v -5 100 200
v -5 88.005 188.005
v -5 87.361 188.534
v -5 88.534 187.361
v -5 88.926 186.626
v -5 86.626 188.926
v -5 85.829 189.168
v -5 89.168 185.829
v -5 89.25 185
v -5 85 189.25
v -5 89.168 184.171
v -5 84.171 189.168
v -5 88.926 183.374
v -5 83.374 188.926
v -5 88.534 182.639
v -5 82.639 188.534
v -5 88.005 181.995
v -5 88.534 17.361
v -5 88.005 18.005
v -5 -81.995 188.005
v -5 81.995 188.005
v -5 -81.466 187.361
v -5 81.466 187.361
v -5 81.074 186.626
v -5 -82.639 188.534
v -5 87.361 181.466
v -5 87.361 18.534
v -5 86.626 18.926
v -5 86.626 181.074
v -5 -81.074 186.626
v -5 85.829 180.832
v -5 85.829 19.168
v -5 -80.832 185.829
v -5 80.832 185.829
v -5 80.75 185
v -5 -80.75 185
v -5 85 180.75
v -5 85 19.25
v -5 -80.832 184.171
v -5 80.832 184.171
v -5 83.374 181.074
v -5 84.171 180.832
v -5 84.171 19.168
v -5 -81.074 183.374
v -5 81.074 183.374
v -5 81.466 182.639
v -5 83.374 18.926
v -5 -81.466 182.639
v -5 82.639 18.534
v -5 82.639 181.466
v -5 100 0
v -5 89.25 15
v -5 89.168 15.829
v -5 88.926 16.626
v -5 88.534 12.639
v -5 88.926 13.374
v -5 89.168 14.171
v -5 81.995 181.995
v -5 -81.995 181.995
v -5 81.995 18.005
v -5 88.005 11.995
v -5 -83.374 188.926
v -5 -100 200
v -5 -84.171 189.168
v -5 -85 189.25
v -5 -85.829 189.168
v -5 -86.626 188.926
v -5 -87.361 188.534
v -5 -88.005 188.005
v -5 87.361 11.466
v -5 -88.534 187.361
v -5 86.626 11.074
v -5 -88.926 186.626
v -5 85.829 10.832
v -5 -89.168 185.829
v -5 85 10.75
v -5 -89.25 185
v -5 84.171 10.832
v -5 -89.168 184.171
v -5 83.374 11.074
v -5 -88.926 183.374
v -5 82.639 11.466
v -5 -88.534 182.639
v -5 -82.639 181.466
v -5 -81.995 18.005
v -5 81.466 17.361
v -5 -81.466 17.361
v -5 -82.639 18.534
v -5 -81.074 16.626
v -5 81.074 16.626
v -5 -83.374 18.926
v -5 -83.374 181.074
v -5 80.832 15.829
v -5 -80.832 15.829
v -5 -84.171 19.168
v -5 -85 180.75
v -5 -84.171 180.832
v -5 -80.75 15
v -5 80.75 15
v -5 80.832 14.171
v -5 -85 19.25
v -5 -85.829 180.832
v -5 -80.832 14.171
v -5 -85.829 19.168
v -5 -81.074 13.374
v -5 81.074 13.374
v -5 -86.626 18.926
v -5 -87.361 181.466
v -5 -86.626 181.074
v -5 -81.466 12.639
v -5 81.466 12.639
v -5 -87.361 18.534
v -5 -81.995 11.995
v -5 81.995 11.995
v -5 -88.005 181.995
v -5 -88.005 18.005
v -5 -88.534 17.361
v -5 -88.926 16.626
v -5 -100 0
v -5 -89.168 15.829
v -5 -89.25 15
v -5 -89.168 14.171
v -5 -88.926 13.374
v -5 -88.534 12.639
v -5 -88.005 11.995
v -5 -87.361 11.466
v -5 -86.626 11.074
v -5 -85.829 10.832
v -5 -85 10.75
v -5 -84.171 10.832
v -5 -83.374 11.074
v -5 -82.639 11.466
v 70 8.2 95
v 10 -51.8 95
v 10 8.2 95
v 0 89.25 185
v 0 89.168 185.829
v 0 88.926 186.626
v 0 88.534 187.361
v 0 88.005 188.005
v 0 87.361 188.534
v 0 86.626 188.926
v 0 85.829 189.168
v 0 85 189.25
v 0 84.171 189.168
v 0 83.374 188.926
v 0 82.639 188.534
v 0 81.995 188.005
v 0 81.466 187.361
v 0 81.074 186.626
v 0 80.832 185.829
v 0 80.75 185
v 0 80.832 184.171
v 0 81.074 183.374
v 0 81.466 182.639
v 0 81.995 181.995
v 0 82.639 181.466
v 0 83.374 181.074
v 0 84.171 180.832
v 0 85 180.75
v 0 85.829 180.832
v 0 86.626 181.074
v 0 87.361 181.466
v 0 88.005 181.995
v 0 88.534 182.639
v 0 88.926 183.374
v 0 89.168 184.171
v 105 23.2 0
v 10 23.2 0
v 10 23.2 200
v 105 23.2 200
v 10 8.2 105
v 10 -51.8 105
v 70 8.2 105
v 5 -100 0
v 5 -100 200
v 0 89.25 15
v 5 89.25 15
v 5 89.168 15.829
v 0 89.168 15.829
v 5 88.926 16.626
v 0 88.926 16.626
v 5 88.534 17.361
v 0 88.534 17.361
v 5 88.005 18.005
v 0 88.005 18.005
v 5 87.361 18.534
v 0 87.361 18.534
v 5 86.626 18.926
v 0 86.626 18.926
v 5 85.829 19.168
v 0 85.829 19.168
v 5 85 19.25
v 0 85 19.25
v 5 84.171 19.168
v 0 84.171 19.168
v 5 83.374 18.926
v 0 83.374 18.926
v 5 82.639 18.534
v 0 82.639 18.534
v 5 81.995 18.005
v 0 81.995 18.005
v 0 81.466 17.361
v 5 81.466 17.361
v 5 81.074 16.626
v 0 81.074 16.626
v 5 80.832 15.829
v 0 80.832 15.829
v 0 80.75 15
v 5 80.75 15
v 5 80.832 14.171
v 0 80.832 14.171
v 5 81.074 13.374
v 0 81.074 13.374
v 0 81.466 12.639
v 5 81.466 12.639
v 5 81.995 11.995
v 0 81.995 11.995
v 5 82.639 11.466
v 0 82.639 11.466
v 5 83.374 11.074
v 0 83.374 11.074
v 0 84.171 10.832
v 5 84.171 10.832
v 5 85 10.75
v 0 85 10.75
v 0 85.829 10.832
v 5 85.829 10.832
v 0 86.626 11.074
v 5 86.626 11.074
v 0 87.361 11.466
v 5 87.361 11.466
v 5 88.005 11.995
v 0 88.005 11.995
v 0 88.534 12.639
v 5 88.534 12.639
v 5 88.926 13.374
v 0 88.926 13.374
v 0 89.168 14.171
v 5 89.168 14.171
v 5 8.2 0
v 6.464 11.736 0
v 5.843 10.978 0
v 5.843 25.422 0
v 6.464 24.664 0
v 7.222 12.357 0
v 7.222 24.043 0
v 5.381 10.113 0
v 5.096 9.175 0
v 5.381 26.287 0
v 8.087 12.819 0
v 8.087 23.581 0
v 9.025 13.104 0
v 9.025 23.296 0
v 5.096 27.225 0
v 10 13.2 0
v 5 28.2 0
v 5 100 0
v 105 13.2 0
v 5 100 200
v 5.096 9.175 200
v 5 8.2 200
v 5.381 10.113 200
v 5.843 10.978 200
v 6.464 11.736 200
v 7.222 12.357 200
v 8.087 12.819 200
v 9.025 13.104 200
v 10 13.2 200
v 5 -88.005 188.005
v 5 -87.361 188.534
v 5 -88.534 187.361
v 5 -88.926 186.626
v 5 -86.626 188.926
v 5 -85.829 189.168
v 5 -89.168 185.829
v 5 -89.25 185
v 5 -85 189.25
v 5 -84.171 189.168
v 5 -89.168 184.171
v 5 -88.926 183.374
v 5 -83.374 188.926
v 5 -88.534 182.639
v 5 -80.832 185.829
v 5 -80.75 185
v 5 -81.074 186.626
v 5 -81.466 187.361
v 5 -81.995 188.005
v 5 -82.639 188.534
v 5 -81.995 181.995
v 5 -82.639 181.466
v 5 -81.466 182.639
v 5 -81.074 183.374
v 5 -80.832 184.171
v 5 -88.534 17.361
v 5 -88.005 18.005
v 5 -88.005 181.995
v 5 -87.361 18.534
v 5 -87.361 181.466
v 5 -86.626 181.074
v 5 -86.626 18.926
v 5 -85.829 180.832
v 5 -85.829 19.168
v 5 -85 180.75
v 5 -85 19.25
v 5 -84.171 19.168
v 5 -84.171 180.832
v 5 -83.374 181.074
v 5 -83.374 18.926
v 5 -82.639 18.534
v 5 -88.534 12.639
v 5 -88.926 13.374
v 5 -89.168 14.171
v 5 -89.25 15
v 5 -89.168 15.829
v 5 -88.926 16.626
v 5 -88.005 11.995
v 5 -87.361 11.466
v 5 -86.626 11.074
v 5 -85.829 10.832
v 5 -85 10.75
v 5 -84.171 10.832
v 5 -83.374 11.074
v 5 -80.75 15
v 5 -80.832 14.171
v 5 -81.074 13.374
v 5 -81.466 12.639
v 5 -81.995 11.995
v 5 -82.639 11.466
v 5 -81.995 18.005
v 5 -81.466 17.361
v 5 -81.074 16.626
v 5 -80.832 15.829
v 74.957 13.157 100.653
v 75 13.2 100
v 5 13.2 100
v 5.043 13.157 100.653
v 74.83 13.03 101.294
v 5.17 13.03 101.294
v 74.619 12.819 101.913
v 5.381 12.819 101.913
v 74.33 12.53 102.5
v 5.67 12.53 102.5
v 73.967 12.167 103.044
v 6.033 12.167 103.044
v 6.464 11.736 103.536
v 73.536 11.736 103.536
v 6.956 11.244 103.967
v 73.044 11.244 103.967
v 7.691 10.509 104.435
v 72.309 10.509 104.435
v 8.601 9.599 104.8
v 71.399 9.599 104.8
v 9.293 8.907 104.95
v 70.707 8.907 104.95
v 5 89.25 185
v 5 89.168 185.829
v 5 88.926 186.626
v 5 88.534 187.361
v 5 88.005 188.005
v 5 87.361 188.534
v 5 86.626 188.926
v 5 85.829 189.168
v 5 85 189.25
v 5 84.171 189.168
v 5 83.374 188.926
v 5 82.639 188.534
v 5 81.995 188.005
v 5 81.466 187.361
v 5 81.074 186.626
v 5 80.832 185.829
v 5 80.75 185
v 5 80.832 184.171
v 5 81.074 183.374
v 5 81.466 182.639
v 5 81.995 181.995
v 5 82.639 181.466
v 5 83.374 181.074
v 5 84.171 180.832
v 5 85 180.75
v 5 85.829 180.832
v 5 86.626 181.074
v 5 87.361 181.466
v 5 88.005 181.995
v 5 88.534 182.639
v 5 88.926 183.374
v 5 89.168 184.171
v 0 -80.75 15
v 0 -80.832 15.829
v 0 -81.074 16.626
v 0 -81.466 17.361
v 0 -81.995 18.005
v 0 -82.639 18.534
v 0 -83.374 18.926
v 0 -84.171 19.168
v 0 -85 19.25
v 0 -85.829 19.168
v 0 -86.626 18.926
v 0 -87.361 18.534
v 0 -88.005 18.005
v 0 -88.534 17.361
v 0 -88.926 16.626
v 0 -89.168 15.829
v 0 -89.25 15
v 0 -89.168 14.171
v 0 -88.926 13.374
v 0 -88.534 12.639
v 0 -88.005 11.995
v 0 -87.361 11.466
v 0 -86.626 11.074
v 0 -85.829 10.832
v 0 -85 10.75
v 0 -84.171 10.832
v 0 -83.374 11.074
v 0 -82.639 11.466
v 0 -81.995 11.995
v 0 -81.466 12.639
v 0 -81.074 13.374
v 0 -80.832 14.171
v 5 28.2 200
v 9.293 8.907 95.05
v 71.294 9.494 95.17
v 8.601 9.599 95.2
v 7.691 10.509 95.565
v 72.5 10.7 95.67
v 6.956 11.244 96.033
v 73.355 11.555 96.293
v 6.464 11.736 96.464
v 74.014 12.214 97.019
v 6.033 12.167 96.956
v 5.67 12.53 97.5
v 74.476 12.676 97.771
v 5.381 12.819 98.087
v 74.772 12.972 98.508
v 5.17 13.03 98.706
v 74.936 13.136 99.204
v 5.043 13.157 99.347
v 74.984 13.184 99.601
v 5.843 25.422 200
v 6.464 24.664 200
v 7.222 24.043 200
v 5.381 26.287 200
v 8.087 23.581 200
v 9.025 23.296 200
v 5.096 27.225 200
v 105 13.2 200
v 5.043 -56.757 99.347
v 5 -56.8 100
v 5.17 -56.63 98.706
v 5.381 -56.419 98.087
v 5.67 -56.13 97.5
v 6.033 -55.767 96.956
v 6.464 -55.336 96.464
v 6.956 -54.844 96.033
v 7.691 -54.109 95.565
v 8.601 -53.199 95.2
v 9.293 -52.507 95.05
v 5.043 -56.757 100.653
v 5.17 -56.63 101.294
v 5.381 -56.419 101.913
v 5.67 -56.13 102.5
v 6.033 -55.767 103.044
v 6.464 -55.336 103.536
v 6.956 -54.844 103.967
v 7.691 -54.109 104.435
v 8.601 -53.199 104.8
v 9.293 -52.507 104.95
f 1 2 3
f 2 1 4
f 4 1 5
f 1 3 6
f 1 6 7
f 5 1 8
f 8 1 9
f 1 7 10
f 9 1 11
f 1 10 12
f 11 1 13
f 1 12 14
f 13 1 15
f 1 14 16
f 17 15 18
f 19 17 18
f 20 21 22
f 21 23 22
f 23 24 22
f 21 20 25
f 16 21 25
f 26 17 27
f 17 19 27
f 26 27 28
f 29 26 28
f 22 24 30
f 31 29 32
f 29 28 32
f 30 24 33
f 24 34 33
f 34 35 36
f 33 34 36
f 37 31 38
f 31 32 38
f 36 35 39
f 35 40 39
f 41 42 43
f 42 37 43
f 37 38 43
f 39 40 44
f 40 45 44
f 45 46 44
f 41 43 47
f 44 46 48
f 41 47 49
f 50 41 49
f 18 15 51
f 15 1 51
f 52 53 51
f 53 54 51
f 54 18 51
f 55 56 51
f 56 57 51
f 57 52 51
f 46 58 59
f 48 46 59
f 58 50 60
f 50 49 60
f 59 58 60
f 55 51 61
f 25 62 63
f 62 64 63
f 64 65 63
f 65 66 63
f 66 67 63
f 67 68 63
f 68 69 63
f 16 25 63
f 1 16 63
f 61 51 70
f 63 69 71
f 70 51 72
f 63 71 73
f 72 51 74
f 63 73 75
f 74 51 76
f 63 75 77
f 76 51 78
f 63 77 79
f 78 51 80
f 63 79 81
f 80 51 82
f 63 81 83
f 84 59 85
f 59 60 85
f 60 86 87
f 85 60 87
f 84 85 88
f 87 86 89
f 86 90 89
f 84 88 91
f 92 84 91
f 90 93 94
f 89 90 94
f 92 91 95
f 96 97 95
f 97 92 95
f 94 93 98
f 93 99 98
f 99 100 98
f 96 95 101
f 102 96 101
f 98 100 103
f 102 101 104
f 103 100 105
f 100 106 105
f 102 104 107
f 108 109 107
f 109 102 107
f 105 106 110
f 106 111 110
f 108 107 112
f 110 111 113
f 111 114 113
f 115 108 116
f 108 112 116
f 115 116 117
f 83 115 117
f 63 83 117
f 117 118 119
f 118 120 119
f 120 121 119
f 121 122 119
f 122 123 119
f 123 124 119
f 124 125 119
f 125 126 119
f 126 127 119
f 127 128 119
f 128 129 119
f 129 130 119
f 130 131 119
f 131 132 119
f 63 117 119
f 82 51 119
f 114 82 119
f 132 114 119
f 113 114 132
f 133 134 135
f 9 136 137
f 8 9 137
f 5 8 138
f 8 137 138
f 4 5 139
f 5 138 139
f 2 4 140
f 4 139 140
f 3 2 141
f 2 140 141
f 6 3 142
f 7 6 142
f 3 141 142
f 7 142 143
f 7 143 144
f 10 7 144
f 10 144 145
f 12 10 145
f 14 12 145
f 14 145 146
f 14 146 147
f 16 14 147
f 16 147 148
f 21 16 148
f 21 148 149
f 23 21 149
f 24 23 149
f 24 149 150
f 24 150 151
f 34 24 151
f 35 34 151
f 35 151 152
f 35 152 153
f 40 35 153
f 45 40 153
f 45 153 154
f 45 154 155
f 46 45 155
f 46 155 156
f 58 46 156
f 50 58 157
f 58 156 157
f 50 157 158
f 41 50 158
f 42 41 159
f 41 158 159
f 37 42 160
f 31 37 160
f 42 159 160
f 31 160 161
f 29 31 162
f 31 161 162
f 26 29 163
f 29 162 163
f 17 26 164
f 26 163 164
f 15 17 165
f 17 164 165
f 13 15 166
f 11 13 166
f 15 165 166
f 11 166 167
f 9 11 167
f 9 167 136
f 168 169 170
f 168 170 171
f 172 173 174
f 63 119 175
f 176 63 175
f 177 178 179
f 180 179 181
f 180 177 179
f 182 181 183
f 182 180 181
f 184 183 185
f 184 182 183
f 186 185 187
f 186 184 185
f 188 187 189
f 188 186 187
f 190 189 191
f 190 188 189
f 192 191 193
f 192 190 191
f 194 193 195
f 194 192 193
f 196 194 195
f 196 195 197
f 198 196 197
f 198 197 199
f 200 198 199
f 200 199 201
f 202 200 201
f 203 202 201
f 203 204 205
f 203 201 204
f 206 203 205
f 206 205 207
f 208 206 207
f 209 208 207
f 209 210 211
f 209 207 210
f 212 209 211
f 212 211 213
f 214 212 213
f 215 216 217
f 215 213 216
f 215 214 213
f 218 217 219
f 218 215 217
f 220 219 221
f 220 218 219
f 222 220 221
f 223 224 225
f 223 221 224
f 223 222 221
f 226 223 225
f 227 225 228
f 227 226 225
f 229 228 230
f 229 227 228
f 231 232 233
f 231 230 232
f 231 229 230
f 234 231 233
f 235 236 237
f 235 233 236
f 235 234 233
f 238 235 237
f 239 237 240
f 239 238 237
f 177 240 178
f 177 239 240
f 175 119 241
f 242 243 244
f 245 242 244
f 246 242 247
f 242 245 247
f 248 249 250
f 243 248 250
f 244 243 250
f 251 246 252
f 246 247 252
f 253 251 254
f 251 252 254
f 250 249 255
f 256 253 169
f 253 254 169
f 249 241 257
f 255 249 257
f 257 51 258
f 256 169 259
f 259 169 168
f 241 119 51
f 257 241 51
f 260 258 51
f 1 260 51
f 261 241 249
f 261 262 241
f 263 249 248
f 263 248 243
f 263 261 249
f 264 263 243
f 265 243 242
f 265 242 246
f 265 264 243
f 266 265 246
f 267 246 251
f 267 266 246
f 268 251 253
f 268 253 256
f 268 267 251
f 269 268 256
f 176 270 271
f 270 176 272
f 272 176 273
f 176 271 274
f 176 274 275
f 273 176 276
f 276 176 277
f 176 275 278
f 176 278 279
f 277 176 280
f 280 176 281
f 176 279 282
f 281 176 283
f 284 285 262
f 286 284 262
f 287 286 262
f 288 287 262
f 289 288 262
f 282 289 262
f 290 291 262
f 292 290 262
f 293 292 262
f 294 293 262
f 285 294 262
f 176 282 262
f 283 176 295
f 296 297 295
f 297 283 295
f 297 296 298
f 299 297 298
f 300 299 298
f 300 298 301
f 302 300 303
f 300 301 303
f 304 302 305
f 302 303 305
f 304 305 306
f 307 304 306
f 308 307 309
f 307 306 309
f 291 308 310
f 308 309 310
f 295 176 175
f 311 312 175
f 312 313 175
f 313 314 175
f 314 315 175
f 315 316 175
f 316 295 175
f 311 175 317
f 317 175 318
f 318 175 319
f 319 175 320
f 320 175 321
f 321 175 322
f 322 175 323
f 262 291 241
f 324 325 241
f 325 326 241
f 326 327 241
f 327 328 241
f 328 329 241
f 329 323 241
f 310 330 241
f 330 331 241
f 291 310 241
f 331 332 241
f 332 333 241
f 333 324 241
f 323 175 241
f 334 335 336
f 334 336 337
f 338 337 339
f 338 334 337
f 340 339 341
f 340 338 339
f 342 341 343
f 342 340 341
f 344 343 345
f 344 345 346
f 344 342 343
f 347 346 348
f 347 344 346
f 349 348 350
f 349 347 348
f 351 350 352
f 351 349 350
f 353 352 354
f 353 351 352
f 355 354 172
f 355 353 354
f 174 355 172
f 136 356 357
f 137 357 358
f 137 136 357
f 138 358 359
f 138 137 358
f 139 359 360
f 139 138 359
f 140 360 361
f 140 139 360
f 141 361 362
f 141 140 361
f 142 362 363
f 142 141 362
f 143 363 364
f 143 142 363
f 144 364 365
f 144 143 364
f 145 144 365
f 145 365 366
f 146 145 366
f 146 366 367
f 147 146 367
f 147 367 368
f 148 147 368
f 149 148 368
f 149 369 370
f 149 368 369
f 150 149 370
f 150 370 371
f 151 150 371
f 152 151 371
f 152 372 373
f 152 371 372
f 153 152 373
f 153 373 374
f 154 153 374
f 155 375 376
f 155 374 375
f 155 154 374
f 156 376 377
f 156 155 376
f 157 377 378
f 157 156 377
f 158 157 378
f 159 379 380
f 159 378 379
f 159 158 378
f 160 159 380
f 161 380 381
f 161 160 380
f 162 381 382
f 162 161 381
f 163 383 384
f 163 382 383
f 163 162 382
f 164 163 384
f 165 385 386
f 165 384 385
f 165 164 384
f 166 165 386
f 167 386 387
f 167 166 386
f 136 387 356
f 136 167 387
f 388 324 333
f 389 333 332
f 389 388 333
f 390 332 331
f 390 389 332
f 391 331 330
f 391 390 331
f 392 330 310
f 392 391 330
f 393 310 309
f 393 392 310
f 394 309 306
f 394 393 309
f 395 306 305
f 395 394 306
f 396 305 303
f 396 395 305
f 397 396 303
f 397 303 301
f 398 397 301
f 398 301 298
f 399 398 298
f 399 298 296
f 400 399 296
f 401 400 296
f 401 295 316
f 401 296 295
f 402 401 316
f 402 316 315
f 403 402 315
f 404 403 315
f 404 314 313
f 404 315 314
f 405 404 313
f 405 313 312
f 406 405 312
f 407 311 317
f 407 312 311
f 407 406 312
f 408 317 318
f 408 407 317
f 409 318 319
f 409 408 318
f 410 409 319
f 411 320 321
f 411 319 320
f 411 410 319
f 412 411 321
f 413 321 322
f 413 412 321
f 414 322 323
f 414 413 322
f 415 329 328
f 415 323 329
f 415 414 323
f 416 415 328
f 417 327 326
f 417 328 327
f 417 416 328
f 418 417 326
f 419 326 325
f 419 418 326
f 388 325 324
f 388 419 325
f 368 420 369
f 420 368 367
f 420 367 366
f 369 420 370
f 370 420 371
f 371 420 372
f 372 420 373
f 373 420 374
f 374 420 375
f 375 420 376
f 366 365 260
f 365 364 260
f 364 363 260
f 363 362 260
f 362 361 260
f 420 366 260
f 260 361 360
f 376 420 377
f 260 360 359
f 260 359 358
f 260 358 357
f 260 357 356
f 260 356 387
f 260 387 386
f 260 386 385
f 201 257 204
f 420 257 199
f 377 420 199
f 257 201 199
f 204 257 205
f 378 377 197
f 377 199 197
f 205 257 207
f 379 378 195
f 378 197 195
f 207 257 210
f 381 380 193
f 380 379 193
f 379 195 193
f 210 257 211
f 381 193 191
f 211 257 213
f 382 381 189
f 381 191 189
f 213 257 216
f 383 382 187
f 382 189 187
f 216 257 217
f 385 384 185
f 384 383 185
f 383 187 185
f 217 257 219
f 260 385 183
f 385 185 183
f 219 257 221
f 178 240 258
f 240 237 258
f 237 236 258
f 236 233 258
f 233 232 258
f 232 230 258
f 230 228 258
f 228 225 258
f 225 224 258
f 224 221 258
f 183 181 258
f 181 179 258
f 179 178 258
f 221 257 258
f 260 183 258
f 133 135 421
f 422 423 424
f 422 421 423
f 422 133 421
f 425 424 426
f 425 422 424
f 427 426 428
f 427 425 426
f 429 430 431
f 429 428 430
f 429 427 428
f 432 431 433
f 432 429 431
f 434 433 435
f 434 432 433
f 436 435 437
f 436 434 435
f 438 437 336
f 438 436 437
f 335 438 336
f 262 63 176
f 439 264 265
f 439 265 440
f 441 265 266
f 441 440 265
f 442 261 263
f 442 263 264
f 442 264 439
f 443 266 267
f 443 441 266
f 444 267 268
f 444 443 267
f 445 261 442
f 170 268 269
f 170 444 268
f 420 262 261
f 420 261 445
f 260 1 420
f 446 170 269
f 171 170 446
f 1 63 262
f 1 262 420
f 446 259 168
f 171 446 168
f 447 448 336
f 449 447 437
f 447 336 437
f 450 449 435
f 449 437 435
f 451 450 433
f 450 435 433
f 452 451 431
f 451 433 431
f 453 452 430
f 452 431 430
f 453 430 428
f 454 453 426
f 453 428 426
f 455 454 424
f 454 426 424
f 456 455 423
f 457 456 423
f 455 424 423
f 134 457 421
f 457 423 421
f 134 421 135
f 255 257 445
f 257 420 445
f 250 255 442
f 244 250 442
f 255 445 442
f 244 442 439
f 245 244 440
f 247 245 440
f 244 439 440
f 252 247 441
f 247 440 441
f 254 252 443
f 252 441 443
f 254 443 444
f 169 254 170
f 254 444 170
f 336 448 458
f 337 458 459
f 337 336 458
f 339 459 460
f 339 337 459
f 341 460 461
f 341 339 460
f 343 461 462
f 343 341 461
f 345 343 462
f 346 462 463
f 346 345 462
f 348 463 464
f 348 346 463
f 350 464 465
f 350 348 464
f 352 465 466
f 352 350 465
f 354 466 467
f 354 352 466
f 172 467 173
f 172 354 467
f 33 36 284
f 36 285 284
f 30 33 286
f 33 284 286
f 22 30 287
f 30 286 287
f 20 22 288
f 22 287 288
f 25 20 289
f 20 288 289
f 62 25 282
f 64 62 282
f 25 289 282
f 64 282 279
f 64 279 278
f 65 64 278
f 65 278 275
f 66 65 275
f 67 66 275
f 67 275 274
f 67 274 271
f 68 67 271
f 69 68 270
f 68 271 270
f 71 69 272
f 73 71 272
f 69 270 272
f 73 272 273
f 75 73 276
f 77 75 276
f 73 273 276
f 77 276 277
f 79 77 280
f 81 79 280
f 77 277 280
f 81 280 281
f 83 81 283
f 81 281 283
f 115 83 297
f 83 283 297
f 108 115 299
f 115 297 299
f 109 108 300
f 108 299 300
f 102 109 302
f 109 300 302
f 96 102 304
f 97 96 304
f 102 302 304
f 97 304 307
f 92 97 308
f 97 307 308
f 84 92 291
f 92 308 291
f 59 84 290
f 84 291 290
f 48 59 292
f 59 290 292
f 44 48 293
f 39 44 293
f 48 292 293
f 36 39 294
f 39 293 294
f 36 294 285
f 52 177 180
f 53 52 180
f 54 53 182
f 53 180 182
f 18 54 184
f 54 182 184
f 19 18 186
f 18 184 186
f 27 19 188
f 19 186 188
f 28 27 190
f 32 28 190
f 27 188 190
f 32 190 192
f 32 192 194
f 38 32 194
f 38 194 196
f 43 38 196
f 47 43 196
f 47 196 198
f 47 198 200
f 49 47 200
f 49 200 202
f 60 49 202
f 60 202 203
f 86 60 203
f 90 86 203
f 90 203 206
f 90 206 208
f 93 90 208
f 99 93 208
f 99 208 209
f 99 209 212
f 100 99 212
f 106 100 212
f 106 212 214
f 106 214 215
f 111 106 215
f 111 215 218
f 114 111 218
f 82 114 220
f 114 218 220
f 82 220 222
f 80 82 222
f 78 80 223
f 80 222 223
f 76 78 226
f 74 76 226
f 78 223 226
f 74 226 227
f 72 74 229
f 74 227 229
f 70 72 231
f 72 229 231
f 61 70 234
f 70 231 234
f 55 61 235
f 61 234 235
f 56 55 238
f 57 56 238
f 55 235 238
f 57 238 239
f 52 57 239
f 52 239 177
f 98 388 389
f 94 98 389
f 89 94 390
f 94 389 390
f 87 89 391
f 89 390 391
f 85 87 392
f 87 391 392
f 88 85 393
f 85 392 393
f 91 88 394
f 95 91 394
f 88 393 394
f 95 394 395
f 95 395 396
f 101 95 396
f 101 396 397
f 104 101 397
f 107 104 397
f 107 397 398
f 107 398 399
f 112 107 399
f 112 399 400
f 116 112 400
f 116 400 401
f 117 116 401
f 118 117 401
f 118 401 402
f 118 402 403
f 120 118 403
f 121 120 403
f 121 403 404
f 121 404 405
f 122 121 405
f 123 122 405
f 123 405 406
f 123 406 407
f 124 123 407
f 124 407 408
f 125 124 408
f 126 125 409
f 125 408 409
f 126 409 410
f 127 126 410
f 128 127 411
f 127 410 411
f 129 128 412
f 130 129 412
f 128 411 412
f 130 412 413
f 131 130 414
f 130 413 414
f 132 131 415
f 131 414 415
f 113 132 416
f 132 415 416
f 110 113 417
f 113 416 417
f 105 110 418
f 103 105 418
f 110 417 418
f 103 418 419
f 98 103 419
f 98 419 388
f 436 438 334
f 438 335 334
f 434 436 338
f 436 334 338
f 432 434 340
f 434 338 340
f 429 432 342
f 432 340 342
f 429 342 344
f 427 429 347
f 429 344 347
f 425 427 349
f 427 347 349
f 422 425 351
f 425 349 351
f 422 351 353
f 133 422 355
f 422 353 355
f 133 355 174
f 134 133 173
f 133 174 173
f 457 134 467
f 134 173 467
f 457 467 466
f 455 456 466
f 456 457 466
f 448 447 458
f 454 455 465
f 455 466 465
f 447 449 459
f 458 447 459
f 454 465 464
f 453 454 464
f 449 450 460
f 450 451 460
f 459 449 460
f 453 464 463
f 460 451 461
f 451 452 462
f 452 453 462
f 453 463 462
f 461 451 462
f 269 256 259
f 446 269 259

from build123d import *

# Parameters (mm, degrees)
F0_W      = 100
F0_H      = 10
F1_DEPTH  = 200
F2_W      = 70
F2_H      = 10
F3_DEPTH  = 70
F5_DEPTH  = 70
F6_R      = 4.25
F7_DEPTH  = 12.5
F9_W      = 70
F9_H      = 10
F10_DEPTH = 70
F12_DEPTH = 25
F13_R     = 4.99999
F13_2_R   = 4.99999


# Not quite as in the source:
# - a fillet or chamfer is up to 0.001 mm smaller than in the source, because OpenCascade refuses the exact size


with BuildPart() as f1:
    # F0 (on Top) → F1 (new body)
    with BuildSketch(Plane.XY):
        Polygon((5, 100), (-5, 100), (-5, -100), (5, -100), (5, 13.2), (5, 23.2), align=None)
        with Locations((55, 18.2)):
            Rectangle(F0_W, F0_H)
    extrude(amount=F1_DEPTH)

    # F6 (on Right) → F7 (cut, symmetric)
    with BuildSketch(Plane.YZ):
        with Locations((85, 185)):
            Circle(F6_R)
        with Locations((85, 15)):
            Circle(F6_R)
        with Locations((-85, 15)):
            Circle(F6_R)
        with Locations((-85, 185)):
            Circle(F6_R)
    extrude(amount=F7_DEPTH, both=True, mode=Mode.SUBTRACT)

    # F13 (radius 5 in the source; OpenCascade refuses exactly that, so slightly less here)
    f13_edges = [f1.edges().sort_by_distance(p)[0] for p in [
        (5, 13.2, 100),
        (5, 23.2, 100),
    ]]
    fillet(f13_edges, radius=F13_R)


with BuildPart() as f3:
    # F2 (on face) → F3 (new body)
    with BuildSketch(Plane.YZ.offset(5)):
        with Locations((-21.8, 100)):
            Rectangle(F2_W, F2_H)
    extrude(amount=F3_DEPTH)

    # F4 (on face) → F5 (cut)
    with BuildSketch(Plane.XY.offset(105)):
        Polygon((75, 13.2), (5, -56.8), (75, -56.8), align=None)
    extrude(amount=-F5_DEPTH, mode=Mode.SUBTRACT)


with BuildPart() as f10:
    # F9 (on face) → F10 (new body)
    with BuildSketch(Plane.YZ.offset(5)):
        with Locations((-21.8, 100)):
            Rectangle(F9_W, F9_H)
    extrude(amount=F10_DEPTH)

    # F11 (on face) → F12 (cut)
    with BuildSketch(Plane.XY.offset(105)):
        Polygon((75, 13.2), (5, -56.8), (75, -56.8), align=None)
    extrude(amount=-F12_DEPTH, mode=Mode.SUBTRACT)

    # F13#2 (radius 5 in the source; OpenCascade refuses exactly that, so slightly less here)
    f13_2_edges = [f10.edges().sort_by_distance(p)[0] for p in [
        (40, 13.2, 105),
        (5, -21.8, 105),
        (5, -21.8, 95),
        (40, 13.2, 95),
    ]]
    fillet(f13_2_edges, radius=F13_2_R)


solid = Compound([f1.part, f10.part])
